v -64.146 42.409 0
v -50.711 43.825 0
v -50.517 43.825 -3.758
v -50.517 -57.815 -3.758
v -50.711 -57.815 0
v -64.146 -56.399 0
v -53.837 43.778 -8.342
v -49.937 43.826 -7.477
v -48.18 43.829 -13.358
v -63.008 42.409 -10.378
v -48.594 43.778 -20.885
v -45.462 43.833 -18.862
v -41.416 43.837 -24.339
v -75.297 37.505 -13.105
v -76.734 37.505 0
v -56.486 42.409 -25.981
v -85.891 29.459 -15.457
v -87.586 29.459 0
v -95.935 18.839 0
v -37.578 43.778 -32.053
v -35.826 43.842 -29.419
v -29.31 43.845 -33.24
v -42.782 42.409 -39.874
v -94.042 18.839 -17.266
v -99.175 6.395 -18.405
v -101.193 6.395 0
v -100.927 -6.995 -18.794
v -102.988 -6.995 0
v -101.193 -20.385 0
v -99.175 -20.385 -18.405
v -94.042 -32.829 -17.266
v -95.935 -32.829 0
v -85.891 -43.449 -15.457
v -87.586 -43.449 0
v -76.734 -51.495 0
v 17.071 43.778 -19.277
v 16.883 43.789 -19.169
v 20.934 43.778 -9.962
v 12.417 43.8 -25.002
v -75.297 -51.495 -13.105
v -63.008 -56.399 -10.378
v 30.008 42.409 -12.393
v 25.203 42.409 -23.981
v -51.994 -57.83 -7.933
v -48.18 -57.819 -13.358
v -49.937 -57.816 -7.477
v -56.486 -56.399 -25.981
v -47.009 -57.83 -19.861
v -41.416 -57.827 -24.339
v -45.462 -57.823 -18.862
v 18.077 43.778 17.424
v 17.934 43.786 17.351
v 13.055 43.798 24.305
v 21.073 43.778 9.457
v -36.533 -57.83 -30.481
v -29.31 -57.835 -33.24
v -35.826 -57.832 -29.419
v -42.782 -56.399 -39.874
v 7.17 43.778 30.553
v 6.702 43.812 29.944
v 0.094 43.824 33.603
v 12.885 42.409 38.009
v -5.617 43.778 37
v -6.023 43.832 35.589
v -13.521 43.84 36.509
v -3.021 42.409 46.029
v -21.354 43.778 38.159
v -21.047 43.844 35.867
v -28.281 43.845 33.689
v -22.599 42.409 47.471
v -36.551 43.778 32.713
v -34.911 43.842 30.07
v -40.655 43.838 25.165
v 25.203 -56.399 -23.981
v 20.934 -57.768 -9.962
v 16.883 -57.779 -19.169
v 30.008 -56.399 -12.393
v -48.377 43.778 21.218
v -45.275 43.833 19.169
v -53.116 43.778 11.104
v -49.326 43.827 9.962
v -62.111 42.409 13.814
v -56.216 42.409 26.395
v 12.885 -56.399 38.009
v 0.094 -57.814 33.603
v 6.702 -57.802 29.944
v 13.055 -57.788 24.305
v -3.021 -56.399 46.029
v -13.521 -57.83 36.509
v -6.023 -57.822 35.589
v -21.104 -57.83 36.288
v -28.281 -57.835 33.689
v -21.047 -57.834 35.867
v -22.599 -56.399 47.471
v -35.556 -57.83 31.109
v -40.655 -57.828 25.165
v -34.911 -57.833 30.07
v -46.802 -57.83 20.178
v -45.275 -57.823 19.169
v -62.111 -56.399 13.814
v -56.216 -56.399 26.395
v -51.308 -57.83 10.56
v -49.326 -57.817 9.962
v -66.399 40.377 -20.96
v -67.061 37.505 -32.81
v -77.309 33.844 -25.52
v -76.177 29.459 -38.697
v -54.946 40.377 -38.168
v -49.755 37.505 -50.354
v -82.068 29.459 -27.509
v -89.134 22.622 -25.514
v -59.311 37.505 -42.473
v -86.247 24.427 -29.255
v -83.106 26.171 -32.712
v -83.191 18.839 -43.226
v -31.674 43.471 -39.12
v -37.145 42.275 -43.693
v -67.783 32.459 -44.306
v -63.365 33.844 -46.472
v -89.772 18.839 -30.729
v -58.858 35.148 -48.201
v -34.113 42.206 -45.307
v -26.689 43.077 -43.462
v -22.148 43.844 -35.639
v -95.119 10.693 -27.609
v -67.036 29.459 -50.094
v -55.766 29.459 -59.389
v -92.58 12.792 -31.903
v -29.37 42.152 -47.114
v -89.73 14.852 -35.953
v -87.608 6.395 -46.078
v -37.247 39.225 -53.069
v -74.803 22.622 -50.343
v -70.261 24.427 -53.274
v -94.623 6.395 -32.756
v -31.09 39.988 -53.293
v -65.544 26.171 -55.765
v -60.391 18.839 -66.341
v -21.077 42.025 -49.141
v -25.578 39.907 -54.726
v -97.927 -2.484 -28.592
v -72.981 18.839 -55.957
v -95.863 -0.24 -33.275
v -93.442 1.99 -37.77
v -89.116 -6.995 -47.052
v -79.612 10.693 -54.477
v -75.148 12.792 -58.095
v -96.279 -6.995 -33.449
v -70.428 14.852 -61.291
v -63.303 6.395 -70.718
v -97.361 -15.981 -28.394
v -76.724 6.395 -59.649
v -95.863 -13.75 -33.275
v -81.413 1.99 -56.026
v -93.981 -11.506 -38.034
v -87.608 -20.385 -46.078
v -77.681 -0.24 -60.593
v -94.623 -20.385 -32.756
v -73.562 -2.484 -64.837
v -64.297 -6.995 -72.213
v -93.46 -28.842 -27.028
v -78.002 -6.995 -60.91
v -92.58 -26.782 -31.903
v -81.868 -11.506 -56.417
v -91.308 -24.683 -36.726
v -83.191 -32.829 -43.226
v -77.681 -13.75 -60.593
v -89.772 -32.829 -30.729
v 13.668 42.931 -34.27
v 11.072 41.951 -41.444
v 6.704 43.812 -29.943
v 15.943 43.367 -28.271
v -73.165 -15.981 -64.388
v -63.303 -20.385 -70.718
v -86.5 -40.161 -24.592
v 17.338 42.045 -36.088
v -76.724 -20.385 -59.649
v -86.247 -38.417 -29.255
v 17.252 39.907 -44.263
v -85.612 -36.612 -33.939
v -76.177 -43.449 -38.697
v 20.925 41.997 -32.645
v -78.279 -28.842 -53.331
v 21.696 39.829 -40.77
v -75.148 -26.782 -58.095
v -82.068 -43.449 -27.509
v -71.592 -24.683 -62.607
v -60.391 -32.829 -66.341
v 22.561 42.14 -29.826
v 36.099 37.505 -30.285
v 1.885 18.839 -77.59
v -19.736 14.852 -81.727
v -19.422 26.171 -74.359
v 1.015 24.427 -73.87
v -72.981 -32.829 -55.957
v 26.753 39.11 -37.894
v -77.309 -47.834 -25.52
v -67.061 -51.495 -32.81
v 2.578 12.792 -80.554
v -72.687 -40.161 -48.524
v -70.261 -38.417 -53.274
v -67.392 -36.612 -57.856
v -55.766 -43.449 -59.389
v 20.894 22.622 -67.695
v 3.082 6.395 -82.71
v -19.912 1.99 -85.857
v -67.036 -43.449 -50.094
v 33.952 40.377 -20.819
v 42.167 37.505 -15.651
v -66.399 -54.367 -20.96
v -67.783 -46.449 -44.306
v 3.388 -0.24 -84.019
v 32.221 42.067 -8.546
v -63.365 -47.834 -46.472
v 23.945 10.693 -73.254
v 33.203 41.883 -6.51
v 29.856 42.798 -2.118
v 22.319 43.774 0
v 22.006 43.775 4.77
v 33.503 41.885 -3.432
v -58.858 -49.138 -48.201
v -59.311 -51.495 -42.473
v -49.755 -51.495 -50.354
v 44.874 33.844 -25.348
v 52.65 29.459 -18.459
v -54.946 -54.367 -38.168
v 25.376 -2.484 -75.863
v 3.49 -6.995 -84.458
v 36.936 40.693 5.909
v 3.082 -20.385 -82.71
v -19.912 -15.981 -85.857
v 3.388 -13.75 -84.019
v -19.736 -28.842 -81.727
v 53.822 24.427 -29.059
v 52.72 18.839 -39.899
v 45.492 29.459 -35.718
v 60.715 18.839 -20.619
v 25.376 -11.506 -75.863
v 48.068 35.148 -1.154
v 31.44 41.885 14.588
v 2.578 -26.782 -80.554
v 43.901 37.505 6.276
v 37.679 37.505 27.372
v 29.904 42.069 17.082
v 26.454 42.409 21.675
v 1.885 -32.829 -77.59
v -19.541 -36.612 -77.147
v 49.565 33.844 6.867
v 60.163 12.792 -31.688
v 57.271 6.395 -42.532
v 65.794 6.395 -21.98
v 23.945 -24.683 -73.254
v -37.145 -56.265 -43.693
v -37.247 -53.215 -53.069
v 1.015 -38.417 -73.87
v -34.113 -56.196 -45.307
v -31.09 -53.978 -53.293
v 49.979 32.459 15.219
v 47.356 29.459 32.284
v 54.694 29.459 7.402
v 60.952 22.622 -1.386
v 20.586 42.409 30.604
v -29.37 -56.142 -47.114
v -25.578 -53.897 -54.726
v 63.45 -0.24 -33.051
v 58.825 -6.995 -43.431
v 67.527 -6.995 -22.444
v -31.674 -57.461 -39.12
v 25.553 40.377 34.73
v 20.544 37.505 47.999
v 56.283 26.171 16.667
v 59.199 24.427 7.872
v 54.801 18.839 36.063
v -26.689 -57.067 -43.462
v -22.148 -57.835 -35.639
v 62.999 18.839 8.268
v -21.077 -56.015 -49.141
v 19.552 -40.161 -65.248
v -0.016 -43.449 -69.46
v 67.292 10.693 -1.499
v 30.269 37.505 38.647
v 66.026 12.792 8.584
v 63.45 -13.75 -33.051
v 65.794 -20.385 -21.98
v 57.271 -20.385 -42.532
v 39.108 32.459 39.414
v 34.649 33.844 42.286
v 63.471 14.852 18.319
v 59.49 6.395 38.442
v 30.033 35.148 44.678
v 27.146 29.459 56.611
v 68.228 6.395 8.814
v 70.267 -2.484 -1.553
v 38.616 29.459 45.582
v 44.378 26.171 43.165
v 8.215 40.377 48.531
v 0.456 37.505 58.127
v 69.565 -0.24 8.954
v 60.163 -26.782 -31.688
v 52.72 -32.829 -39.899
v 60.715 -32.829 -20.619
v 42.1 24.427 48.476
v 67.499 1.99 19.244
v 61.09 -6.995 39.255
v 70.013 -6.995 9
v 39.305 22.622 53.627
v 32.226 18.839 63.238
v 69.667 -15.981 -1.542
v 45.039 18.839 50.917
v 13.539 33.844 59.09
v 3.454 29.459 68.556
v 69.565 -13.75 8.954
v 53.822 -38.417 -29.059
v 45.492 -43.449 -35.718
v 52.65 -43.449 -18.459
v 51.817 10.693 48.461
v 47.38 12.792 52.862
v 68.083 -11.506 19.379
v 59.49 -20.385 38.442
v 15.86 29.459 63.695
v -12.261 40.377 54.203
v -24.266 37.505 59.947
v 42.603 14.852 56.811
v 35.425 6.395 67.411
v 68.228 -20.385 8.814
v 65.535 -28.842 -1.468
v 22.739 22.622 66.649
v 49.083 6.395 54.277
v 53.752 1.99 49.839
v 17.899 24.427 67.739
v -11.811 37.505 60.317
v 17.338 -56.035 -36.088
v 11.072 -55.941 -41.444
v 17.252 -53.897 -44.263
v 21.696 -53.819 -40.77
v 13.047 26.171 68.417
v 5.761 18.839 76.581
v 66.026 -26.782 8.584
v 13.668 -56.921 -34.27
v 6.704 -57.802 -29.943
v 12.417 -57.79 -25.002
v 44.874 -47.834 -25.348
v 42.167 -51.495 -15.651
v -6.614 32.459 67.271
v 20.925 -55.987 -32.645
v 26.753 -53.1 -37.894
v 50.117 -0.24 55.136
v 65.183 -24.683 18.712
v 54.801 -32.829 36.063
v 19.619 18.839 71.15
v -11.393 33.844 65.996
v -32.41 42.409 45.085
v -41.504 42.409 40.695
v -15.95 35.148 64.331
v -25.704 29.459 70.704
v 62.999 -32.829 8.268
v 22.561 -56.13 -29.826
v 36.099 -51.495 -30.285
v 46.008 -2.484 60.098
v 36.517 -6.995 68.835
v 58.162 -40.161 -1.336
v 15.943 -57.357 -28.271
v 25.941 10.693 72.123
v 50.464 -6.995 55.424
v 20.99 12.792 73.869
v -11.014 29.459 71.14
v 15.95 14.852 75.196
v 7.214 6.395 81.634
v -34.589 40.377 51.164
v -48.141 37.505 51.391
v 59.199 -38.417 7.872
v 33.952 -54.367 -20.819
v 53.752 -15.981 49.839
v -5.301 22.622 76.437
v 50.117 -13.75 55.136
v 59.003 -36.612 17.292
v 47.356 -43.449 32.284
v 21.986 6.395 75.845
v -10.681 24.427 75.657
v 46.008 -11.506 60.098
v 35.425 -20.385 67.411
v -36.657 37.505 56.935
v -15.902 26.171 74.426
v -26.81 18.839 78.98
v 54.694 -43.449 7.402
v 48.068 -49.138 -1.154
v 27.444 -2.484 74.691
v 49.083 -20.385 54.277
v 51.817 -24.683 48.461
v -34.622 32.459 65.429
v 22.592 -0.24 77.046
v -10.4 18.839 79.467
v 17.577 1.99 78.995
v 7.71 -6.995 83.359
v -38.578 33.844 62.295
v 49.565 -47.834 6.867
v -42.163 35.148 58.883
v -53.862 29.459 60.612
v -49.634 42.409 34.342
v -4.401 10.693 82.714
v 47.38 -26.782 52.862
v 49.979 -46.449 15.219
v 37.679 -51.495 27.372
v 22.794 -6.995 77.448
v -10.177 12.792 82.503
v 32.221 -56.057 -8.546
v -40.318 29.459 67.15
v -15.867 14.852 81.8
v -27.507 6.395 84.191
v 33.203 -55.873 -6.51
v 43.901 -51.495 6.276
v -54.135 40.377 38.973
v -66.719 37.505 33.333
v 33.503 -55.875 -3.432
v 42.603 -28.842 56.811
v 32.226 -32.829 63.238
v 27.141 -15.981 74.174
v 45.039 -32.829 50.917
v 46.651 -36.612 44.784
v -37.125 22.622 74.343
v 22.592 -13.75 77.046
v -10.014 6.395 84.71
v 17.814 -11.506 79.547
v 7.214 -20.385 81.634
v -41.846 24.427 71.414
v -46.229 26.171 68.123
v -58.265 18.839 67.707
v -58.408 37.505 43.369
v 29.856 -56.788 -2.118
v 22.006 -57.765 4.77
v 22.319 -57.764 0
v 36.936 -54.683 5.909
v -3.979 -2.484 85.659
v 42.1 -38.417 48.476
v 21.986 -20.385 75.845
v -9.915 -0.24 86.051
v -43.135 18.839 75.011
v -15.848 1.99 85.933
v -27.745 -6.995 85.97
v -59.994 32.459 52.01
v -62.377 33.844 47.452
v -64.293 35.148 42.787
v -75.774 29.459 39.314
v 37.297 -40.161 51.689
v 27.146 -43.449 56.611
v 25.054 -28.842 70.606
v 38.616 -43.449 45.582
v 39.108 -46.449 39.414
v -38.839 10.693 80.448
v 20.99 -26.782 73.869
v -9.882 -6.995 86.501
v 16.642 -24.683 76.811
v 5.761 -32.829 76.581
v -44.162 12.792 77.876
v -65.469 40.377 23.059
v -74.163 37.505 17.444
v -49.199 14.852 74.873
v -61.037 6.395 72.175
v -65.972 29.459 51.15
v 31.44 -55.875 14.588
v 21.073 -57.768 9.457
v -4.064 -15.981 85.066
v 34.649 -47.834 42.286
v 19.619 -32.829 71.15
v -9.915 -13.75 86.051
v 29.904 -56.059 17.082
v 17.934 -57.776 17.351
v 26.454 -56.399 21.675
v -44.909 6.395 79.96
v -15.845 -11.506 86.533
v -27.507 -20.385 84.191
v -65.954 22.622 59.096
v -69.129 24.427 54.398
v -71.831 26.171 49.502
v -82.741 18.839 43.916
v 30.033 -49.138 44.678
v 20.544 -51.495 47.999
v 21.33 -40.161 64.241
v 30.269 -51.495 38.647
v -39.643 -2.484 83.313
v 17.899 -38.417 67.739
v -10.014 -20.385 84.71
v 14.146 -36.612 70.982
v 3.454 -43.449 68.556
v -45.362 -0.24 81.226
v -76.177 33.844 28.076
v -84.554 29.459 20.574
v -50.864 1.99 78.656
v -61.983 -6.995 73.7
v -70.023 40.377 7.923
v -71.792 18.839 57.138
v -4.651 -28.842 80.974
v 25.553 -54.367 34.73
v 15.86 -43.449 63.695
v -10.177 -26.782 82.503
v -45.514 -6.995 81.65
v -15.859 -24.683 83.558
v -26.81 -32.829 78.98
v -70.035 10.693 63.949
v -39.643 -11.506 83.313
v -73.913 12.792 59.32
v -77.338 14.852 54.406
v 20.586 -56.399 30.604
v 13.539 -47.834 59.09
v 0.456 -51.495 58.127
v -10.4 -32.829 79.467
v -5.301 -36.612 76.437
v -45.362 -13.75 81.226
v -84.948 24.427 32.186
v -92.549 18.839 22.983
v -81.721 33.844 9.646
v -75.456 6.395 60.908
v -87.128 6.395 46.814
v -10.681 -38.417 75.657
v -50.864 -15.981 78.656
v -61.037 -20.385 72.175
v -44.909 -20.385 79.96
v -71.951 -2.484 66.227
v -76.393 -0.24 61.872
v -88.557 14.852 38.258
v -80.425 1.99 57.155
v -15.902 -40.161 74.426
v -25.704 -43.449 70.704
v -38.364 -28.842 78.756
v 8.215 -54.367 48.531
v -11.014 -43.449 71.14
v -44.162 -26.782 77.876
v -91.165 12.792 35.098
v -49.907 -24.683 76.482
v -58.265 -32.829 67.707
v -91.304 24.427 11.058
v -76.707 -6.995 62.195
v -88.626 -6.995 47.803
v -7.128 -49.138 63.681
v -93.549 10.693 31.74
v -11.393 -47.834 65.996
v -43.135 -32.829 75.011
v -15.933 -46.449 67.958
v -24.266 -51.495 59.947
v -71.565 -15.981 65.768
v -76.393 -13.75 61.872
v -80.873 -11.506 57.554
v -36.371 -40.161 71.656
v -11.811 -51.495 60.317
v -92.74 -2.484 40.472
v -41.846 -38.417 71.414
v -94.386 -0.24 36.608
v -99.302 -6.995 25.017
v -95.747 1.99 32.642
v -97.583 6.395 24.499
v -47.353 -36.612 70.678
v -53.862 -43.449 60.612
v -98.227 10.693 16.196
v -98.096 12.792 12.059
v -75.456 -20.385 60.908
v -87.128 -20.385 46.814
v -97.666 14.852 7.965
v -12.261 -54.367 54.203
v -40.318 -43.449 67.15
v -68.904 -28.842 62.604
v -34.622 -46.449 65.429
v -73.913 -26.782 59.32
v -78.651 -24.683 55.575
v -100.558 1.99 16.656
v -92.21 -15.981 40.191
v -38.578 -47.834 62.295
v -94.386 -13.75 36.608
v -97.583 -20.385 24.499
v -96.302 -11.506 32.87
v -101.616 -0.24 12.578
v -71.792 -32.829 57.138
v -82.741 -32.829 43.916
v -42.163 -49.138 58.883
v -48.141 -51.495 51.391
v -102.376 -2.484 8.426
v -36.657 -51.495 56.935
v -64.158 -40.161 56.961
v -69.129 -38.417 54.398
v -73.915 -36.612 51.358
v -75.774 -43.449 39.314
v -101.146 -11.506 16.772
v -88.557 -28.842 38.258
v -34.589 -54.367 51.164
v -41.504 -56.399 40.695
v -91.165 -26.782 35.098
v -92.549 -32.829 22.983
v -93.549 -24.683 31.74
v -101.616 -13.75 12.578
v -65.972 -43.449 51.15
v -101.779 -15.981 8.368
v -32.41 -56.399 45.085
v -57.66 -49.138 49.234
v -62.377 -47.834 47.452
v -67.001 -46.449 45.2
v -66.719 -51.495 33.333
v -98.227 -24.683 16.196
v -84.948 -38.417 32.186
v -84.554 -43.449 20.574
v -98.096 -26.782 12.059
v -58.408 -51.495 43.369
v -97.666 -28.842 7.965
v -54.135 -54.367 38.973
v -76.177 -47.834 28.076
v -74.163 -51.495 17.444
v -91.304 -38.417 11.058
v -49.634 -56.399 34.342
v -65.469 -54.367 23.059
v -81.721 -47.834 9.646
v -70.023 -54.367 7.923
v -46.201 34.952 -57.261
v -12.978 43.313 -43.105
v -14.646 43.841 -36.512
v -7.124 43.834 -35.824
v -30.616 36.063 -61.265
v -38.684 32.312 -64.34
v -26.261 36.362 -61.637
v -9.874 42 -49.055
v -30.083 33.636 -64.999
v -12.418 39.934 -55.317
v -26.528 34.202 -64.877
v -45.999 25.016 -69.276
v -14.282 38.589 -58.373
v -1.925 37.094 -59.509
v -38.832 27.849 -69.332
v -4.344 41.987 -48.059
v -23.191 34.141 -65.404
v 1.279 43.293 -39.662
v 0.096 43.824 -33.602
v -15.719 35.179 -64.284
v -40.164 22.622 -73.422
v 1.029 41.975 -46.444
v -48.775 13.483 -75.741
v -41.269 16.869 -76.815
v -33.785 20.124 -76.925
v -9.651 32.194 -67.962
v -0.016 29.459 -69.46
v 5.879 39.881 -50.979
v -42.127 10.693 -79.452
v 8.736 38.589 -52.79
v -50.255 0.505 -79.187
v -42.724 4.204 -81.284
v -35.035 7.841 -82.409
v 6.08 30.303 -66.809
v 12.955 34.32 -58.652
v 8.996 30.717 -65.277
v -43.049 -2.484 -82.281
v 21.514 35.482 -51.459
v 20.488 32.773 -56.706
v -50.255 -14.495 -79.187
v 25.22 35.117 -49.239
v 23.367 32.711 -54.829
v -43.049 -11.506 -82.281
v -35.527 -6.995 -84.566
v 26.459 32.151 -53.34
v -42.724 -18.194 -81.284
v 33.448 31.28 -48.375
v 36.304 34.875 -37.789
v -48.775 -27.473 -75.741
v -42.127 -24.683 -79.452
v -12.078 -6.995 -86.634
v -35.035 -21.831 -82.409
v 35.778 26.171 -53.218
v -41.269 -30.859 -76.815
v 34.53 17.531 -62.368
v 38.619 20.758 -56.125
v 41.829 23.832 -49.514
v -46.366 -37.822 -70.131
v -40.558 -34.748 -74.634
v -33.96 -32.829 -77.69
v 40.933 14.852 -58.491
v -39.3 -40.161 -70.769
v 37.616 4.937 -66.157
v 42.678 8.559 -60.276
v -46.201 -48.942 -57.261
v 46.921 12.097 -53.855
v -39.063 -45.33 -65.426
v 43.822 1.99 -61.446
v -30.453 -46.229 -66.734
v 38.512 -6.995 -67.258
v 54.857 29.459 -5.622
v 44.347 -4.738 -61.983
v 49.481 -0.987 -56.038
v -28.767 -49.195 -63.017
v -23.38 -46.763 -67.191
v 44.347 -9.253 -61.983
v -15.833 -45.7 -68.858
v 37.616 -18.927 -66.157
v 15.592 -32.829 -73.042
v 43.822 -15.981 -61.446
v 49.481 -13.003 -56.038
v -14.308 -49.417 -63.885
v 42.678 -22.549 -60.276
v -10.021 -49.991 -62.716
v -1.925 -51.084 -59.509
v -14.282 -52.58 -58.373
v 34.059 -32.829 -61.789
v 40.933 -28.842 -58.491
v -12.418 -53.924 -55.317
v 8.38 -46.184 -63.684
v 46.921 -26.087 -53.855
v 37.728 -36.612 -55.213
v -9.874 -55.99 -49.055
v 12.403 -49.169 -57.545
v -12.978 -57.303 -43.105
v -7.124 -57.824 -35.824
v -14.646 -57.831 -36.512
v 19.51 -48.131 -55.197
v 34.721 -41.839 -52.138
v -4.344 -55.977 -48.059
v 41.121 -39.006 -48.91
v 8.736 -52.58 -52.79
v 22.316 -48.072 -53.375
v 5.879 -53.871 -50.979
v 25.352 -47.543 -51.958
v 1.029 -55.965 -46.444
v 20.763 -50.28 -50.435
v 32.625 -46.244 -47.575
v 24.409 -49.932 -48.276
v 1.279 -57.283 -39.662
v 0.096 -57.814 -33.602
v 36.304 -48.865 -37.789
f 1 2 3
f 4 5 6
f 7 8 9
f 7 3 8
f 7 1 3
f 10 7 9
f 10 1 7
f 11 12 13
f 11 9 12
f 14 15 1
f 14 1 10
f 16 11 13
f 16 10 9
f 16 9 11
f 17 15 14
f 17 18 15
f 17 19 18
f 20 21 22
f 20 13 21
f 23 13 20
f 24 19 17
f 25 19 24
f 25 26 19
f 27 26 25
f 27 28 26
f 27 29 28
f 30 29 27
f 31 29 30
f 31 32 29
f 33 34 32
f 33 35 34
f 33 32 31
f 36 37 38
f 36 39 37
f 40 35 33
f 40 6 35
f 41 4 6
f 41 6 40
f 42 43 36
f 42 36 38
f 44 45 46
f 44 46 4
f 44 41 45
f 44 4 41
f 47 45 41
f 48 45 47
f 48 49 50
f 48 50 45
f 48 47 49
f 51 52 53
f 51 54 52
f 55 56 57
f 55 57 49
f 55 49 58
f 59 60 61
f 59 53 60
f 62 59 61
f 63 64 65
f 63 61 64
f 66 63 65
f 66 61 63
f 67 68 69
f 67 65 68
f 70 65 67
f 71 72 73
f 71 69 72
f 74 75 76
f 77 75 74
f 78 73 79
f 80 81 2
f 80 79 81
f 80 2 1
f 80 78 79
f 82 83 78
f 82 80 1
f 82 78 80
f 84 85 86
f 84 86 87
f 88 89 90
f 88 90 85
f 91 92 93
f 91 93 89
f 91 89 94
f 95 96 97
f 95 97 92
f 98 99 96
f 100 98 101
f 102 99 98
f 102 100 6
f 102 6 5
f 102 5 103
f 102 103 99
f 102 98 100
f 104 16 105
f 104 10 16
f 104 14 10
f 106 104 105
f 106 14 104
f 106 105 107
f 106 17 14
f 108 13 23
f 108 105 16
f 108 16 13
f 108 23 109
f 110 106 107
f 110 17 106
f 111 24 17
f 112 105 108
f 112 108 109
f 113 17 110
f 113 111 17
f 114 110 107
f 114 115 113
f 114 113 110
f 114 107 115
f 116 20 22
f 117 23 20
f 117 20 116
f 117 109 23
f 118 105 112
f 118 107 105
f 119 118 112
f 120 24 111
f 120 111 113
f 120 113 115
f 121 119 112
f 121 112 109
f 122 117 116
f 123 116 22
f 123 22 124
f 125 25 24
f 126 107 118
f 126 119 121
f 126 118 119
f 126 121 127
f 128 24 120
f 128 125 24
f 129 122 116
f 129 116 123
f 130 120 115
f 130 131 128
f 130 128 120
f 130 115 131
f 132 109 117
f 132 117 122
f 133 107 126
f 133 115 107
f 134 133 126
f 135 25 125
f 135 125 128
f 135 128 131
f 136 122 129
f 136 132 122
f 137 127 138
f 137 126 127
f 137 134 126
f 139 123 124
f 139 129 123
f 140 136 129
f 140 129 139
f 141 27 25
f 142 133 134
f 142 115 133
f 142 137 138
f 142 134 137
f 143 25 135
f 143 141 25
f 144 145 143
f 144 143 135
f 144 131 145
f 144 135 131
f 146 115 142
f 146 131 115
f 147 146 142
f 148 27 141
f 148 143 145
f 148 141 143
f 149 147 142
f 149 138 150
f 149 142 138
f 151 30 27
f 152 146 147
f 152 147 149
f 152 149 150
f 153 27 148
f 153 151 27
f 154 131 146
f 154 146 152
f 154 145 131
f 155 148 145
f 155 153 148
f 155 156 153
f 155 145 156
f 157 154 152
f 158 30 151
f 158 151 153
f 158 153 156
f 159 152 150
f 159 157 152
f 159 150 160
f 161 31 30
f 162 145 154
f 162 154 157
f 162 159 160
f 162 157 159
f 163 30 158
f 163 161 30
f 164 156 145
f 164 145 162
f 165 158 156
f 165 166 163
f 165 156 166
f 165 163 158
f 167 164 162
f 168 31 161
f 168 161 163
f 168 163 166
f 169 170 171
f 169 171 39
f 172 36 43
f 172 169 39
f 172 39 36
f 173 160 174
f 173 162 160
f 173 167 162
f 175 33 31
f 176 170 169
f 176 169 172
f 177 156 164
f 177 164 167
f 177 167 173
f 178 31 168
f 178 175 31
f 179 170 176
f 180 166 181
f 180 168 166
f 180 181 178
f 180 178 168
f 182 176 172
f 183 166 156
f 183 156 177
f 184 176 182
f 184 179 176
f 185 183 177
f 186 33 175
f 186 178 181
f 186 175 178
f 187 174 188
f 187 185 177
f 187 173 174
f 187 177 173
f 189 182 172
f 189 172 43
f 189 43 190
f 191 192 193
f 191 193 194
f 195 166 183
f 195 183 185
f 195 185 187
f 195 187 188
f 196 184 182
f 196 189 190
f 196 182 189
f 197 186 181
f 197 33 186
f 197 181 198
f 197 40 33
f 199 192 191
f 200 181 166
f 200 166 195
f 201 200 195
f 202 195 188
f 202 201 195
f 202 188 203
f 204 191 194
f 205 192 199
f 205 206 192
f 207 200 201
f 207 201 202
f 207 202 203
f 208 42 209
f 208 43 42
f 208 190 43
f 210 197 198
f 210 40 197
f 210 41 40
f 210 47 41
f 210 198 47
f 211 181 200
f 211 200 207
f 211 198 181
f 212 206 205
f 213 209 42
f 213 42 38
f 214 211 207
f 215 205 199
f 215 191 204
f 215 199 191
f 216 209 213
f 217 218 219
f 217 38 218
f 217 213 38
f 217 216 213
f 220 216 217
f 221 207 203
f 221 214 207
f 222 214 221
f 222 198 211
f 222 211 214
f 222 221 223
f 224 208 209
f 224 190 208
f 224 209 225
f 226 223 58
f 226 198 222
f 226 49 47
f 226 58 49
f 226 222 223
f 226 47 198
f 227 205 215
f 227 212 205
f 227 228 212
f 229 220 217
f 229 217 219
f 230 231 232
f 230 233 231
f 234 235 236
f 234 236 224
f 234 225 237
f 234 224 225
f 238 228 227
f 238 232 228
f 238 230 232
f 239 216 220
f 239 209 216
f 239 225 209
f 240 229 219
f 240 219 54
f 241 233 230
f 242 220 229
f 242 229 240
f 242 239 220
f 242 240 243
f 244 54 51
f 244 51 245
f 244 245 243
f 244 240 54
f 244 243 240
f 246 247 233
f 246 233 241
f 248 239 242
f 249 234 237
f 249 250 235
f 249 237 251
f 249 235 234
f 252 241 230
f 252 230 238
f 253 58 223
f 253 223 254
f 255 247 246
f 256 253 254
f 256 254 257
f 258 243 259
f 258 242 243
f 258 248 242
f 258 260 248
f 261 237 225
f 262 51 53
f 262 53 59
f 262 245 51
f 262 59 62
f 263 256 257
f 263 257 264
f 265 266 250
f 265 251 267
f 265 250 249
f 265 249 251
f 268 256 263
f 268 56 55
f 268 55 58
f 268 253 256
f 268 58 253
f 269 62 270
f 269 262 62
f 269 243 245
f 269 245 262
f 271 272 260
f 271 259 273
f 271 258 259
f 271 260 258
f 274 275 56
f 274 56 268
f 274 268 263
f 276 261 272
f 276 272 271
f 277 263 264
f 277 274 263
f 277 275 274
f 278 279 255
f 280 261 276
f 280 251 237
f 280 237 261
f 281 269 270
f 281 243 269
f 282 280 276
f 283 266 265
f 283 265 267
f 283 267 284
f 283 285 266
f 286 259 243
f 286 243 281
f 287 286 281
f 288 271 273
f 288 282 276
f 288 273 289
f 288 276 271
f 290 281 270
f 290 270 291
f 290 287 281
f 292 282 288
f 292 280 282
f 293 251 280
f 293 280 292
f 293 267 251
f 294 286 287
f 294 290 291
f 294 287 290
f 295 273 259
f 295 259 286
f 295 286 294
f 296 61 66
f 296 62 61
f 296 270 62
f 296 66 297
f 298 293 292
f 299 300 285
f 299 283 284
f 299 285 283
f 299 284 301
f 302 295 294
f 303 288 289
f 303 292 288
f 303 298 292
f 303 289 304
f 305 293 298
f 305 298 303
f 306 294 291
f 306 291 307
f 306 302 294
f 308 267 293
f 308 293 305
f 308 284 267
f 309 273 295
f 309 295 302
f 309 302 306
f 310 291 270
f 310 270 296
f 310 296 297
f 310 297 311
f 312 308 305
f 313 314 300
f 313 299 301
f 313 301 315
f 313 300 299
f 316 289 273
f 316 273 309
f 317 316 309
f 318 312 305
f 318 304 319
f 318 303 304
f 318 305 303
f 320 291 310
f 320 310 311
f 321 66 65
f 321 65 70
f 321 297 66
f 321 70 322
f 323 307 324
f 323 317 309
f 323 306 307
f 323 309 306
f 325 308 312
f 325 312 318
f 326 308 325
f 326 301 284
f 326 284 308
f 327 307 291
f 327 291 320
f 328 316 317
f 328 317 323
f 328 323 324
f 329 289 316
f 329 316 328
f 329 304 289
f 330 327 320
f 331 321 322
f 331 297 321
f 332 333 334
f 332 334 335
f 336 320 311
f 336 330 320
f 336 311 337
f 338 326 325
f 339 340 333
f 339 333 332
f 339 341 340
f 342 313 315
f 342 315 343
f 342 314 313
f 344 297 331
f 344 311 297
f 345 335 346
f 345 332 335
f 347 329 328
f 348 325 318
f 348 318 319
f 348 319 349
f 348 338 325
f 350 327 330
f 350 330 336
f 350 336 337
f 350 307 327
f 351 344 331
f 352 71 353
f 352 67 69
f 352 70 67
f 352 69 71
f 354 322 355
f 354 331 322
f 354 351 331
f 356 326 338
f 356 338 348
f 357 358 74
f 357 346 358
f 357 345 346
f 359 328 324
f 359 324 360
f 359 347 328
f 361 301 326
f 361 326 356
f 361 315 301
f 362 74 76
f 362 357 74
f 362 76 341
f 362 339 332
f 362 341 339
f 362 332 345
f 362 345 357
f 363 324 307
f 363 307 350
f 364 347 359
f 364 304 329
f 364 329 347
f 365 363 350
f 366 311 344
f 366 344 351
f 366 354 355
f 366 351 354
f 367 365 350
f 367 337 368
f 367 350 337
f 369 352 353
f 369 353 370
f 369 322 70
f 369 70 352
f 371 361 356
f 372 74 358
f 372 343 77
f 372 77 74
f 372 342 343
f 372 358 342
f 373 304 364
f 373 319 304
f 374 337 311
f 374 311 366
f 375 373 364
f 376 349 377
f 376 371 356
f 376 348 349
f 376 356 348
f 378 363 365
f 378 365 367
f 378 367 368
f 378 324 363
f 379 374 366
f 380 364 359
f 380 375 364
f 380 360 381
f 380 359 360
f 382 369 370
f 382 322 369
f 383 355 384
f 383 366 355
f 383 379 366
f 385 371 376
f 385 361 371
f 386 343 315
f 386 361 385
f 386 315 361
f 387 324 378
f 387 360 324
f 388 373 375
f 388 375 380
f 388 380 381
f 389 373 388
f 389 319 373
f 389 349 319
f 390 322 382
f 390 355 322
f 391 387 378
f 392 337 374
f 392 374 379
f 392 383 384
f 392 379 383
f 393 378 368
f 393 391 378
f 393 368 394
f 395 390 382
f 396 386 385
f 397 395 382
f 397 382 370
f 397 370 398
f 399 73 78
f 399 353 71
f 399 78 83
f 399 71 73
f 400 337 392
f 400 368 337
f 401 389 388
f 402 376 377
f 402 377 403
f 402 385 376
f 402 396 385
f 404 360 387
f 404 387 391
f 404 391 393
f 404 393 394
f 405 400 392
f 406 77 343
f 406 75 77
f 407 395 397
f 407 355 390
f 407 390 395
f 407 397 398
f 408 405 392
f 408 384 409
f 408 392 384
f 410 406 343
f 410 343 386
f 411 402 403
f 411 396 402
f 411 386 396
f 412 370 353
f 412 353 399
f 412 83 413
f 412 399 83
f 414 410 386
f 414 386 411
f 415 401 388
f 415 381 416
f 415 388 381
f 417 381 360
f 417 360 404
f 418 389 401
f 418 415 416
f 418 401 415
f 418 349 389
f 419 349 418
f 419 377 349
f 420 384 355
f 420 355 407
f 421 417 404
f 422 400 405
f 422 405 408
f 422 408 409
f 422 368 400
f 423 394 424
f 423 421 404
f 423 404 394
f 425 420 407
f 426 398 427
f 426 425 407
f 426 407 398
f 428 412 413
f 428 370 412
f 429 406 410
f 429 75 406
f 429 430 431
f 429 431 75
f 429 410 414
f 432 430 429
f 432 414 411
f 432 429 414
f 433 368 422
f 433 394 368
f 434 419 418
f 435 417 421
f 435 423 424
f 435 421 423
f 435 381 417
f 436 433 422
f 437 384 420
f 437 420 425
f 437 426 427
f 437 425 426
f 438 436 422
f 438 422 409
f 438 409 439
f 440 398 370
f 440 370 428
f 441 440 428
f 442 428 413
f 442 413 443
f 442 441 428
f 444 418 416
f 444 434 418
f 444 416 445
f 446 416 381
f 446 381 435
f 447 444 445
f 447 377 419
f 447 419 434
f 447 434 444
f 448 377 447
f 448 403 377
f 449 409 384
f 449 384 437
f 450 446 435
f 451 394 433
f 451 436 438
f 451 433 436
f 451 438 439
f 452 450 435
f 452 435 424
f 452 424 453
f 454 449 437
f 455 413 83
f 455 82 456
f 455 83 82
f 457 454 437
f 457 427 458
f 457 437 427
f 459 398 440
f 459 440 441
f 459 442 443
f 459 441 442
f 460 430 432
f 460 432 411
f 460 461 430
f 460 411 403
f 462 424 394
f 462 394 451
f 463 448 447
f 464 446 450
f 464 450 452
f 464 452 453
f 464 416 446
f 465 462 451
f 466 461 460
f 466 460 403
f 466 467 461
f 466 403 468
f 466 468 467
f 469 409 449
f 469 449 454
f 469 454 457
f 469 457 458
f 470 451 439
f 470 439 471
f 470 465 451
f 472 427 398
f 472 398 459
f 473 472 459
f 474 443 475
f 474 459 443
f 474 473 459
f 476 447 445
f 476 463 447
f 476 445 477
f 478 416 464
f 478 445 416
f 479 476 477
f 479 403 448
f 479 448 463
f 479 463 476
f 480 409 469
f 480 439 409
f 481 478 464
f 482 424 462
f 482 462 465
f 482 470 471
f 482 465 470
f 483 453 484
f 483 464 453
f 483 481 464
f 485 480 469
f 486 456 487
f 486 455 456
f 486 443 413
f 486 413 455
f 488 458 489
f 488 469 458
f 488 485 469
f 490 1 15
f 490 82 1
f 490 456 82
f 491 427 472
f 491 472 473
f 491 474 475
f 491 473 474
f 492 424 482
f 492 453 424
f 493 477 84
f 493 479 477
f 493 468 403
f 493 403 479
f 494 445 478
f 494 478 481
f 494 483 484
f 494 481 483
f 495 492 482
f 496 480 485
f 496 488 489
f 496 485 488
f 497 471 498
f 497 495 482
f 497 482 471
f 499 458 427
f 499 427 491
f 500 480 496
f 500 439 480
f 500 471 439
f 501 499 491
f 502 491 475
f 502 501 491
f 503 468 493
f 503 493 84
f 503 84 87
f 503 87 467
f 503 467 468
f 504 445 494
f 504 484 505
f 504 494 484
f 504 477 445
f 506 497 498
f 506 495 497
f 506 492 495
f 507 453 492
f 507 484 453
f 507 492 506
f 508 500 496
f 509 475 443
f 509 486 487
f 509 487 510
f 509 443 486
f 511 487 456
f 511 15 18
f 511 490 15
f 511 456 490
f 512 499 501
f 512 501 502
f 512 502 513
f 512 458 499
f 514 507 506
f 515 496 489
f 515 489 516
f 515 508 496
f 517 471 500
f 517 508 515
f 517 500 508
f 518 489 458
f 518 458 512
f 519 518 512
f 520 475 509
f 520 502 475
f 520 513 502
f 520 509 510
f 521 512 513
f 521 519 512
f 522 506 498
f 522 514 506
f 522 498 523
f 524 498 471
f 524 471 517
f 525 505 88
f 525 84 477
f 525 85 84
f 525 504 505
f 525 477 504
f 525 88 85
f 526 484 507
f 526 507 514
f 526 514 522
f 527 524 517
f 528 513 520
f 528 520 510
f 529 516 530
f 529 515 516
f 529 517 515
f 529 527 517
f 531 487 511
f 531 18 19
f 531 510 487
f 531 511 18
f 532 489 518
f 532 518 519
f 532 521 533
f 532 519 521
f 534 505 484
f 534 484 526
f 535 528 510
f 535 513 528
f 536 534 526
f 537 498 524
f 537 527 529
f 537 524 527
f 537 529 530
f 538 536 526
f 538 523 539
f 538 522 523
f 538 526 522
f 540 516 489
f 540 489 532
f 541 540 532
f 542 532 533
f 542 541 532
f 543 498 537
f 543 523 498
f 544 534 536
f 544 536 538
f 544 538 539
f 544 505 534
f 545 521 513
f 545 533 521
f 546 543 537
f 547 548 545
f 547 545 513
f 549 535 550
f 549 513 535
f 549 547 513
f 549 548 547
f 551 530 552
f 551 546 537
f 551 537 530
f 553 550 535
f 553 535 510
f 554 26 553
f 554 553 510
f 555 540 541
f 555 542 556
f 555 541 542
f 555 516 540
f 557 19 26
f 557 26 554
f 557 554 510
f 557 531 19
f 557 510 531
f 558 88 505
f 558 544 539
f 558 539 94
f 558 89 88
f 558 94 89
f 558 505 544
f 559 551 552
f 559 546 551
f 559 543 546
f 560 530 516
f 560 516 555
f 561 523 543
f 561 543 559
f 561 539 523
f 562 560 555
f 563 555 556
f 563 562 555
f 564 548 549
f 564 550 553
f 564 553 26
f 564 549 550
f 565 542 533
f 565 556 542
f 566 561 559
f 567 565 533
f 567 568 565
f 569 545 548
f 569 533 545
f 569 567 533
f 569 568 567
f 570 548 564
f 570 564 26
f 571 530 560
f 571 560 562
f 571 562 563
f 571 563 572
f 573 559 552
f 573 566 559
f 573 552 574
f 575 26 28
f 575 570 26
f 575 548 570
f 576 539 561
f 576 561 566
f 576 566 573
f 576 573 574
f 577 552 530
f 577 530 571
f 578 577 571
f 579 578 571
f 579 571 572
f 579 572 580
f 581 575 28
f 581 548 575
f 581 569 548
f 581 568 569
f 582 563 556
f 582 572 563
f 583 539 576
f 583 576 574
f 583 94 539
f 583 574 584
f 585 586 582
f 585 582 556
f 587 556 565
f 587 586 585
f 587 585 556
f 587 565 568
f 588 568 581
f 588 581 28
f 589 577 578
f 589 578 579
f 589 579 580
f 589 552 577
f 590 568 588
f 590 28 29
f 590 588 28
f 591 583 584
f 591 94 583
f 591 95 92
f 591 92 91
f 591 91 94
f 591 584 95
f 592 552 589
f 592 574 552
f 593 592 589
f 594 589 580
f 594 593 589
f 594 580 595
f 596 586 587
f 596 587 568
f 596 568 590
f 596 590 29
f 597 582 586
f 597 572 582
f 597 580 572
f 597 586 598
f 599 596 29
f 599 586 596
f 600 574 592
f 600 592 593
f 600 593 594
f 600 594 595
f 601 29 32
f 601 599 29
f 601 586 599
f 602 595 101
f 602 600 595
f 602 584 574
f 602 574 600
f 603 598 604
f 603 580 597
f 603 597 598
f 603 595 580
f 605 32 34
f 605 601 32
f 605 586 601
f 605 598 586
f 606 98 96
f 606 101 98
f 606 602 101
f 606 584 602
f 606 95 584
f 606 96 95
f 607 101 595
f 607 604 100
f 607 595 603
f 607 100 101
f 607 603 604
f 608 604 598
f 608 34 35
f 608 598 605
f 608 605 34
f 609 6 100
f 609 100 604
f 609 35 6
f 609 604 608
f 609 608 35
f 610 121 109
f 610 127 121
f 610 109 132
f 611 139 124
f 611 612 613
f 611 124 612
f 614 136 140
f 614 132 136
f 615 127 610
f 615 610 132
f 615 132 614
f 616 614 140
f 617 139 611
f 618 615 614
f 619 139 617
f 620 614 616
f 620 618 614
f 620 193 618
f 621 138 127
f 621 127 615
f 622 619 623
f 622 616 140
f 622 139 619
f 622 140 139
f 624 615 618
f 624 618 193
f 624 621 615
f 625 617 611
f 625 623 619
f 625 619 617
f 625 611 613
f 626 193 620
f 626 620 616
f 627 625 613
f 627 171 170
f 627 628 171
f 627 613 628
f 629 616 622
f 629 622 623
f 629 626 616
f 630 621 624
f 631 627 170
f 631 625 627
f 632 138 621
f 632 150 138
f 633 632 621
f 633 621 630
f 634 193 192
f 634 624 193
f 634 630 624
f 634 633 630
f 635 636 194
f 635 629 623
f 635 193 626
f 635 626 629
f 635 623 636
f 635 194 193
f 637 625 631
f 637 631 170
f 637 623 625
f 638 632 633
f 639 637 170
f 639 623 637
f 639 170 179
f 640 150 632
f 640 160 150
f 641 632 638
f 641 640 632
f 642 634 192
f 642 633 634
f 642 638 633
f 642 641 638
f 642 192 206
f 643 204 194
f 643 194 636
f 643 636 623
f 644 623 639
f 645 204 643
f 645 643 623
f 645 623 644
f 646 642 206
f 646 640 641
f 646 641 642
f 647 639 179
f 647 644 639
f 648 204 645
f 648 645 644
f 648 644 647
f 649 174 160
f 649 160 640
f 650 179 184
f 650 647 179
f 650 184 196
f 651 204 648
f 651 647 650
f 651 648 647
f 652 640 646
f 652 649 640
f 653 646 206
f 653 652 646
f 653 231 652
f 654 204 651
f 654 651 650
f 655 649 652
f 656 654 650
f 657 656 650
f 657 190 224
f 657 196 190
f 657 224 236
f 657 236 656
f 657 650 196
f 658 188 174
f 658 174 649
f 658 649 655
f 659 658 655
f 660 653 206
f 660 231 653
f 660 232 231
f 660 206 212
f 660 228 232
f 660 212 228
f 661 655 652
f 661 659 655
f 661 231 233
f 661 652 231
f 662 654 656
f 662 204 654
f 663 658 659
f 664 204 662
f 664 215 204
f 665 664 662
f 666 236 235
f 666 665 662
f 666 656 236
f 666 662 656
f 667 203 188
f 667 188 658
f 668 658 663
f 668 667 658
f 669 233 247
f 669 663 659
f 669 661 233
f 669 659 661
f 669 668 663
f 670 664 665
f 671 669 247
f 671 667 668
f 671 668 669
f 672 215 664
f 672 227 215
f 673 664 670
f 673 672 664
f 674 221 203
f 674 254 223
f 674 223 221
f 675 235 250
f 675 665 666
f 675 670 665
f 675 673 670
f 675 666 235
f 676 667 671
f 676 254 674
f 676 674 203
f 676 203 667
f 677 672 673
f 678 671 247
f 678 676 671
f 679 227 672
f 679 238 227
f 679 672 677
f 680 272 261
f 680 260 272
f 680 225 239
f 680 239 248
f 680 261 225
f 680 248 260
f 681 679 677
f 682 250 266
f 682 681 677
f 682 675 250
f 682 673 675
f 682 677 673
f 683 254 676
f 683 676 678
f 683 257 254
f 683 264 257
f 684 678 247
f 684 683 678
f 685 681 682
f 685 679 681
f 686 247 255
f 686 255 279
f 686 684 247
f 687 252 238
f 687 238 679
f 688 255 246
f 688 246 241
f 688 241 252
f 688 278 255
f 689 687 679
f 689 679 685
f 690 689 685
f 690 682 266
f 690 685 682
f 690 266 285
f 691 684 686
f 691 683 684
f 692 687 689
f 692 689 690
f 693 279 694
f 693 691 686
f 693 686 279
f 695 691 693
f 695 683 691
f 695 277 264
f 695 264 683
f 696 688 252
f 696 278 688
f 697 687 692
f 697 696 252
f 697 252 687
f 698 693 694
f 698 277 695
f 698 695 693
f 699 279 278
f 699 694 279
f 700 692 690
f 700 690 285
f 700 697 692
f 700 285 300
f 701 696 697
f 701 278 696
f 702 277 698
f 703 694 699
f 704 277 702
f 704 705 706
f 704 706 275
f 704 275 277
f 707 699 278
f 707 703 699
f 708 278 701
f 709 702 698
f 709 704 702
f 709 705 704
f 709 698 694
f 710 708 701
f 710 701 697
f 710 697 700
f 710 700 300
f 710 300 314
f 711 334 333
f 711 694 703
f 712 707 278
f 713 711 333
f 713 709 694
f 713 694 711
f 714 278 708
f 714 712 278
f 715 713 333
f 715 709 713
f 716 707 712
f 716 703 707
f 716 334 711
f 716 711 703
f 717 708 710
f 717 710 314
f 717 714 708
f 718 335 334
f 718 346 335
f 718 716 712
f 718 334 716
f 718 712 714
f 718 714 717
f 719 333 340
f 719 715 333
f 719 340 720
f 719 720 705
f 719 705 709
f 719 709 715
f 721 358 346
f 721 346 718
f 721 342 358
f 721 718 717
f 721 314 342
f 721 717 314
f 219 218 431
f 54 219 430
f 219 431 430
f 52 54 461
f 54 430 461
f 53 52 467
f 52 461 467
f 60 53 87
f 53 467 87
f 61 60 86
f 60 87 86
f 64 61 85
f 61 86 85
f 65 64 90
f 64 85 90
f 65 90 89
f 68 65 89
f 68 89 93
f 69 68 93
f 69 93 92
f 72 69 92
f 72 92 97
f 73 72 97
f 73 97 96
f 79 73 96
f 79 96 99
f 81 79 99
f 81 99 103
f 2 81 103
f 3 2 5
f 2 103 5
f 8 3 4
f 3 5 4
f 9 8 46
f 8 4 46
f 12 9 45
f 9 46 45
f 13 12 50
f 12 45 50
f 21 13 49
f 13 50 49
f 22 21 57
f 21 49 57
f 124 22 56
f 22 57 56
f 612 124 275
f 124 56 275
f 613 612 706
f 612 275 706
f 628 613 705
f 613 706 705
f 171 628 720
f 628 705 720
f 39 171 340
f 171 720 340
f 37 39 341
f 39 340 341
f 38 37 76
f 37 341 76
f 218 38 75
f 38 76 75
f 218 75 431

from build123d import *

# Parameters (mm, degrees)
F1_DEPTH = 152.4
F5_R     = 36.5151076764
F6_DEPTH = 76.2


with BuildPart() as f1:
    # F0 (on Top) → F1 (new body)
    with BuildSketch(Plane.XY):
        with BuildLine():
            add(Edge.make_bspline(
                [(-30.1583763212, 26.8533546478), (-35.5003351395, 29.3716106811), (-51.0884137789, 9.6325041789), (-25.2860844502, -4.9136502048), (-45.0252250448, -42.8862151644), (8.5882174045, 8.4418630123), (27.5078921363, -21.9533160161), (34.085605065, -14.777172224), (32.6714684541, 29.7125514383), (9.6282544541, 20.9931932278), (-10.5520933547, 73.391258381), (-25.584204402, 36.4452356852), (-18.7180254716, 37.9365806871), (-17.0410387376, -9.9149224662), (-24.4521007861, 24.1633558509), (-30.1583763212, 26.8533546478)],
                knots=[0, 0, 0, 0, 0.0718142004, 0.1538074866, 0.2258423664, 0.338821539, 0.4206418103, 0.457998906, 0.5591681116, 0.6268881468, 0.7276936964, 0.8033833284, 0.8374228011, 0.9232881367, 1, 1, 1, 1], degree=3))
        make_face()
    extrude(amount=F1_DEPTH)


with BuildPart() as f4:
    # F3 (on Top) → F4 (revolve)
    with BuildSketch(Plane.XY):
        with BuildLine():
            Line((-16.2531528622, -42.9988354445), (-16.2531528622, 29.0087852627))
            ThreePointArc((-16.2531528622, 29.0087852627), (-102.9879565253, -6.9950250909), (-16.2531528622, -42.9988354445))
        make_face()
    revolve(axis=Axis((-16.2531528622, -1.6458891332, 0), (0, -1, 0)))

    # F5 (on Front) → F6 (cut, symmetric)
    with BuildSketch(Plane.XZ):
        with Locations((-14.195789583, 0)):
            Circle(F5_R)
    extrude(amount=F6_DEPTH, both=True, mode=Mode.SUBTRACT)


solid = f4.part
